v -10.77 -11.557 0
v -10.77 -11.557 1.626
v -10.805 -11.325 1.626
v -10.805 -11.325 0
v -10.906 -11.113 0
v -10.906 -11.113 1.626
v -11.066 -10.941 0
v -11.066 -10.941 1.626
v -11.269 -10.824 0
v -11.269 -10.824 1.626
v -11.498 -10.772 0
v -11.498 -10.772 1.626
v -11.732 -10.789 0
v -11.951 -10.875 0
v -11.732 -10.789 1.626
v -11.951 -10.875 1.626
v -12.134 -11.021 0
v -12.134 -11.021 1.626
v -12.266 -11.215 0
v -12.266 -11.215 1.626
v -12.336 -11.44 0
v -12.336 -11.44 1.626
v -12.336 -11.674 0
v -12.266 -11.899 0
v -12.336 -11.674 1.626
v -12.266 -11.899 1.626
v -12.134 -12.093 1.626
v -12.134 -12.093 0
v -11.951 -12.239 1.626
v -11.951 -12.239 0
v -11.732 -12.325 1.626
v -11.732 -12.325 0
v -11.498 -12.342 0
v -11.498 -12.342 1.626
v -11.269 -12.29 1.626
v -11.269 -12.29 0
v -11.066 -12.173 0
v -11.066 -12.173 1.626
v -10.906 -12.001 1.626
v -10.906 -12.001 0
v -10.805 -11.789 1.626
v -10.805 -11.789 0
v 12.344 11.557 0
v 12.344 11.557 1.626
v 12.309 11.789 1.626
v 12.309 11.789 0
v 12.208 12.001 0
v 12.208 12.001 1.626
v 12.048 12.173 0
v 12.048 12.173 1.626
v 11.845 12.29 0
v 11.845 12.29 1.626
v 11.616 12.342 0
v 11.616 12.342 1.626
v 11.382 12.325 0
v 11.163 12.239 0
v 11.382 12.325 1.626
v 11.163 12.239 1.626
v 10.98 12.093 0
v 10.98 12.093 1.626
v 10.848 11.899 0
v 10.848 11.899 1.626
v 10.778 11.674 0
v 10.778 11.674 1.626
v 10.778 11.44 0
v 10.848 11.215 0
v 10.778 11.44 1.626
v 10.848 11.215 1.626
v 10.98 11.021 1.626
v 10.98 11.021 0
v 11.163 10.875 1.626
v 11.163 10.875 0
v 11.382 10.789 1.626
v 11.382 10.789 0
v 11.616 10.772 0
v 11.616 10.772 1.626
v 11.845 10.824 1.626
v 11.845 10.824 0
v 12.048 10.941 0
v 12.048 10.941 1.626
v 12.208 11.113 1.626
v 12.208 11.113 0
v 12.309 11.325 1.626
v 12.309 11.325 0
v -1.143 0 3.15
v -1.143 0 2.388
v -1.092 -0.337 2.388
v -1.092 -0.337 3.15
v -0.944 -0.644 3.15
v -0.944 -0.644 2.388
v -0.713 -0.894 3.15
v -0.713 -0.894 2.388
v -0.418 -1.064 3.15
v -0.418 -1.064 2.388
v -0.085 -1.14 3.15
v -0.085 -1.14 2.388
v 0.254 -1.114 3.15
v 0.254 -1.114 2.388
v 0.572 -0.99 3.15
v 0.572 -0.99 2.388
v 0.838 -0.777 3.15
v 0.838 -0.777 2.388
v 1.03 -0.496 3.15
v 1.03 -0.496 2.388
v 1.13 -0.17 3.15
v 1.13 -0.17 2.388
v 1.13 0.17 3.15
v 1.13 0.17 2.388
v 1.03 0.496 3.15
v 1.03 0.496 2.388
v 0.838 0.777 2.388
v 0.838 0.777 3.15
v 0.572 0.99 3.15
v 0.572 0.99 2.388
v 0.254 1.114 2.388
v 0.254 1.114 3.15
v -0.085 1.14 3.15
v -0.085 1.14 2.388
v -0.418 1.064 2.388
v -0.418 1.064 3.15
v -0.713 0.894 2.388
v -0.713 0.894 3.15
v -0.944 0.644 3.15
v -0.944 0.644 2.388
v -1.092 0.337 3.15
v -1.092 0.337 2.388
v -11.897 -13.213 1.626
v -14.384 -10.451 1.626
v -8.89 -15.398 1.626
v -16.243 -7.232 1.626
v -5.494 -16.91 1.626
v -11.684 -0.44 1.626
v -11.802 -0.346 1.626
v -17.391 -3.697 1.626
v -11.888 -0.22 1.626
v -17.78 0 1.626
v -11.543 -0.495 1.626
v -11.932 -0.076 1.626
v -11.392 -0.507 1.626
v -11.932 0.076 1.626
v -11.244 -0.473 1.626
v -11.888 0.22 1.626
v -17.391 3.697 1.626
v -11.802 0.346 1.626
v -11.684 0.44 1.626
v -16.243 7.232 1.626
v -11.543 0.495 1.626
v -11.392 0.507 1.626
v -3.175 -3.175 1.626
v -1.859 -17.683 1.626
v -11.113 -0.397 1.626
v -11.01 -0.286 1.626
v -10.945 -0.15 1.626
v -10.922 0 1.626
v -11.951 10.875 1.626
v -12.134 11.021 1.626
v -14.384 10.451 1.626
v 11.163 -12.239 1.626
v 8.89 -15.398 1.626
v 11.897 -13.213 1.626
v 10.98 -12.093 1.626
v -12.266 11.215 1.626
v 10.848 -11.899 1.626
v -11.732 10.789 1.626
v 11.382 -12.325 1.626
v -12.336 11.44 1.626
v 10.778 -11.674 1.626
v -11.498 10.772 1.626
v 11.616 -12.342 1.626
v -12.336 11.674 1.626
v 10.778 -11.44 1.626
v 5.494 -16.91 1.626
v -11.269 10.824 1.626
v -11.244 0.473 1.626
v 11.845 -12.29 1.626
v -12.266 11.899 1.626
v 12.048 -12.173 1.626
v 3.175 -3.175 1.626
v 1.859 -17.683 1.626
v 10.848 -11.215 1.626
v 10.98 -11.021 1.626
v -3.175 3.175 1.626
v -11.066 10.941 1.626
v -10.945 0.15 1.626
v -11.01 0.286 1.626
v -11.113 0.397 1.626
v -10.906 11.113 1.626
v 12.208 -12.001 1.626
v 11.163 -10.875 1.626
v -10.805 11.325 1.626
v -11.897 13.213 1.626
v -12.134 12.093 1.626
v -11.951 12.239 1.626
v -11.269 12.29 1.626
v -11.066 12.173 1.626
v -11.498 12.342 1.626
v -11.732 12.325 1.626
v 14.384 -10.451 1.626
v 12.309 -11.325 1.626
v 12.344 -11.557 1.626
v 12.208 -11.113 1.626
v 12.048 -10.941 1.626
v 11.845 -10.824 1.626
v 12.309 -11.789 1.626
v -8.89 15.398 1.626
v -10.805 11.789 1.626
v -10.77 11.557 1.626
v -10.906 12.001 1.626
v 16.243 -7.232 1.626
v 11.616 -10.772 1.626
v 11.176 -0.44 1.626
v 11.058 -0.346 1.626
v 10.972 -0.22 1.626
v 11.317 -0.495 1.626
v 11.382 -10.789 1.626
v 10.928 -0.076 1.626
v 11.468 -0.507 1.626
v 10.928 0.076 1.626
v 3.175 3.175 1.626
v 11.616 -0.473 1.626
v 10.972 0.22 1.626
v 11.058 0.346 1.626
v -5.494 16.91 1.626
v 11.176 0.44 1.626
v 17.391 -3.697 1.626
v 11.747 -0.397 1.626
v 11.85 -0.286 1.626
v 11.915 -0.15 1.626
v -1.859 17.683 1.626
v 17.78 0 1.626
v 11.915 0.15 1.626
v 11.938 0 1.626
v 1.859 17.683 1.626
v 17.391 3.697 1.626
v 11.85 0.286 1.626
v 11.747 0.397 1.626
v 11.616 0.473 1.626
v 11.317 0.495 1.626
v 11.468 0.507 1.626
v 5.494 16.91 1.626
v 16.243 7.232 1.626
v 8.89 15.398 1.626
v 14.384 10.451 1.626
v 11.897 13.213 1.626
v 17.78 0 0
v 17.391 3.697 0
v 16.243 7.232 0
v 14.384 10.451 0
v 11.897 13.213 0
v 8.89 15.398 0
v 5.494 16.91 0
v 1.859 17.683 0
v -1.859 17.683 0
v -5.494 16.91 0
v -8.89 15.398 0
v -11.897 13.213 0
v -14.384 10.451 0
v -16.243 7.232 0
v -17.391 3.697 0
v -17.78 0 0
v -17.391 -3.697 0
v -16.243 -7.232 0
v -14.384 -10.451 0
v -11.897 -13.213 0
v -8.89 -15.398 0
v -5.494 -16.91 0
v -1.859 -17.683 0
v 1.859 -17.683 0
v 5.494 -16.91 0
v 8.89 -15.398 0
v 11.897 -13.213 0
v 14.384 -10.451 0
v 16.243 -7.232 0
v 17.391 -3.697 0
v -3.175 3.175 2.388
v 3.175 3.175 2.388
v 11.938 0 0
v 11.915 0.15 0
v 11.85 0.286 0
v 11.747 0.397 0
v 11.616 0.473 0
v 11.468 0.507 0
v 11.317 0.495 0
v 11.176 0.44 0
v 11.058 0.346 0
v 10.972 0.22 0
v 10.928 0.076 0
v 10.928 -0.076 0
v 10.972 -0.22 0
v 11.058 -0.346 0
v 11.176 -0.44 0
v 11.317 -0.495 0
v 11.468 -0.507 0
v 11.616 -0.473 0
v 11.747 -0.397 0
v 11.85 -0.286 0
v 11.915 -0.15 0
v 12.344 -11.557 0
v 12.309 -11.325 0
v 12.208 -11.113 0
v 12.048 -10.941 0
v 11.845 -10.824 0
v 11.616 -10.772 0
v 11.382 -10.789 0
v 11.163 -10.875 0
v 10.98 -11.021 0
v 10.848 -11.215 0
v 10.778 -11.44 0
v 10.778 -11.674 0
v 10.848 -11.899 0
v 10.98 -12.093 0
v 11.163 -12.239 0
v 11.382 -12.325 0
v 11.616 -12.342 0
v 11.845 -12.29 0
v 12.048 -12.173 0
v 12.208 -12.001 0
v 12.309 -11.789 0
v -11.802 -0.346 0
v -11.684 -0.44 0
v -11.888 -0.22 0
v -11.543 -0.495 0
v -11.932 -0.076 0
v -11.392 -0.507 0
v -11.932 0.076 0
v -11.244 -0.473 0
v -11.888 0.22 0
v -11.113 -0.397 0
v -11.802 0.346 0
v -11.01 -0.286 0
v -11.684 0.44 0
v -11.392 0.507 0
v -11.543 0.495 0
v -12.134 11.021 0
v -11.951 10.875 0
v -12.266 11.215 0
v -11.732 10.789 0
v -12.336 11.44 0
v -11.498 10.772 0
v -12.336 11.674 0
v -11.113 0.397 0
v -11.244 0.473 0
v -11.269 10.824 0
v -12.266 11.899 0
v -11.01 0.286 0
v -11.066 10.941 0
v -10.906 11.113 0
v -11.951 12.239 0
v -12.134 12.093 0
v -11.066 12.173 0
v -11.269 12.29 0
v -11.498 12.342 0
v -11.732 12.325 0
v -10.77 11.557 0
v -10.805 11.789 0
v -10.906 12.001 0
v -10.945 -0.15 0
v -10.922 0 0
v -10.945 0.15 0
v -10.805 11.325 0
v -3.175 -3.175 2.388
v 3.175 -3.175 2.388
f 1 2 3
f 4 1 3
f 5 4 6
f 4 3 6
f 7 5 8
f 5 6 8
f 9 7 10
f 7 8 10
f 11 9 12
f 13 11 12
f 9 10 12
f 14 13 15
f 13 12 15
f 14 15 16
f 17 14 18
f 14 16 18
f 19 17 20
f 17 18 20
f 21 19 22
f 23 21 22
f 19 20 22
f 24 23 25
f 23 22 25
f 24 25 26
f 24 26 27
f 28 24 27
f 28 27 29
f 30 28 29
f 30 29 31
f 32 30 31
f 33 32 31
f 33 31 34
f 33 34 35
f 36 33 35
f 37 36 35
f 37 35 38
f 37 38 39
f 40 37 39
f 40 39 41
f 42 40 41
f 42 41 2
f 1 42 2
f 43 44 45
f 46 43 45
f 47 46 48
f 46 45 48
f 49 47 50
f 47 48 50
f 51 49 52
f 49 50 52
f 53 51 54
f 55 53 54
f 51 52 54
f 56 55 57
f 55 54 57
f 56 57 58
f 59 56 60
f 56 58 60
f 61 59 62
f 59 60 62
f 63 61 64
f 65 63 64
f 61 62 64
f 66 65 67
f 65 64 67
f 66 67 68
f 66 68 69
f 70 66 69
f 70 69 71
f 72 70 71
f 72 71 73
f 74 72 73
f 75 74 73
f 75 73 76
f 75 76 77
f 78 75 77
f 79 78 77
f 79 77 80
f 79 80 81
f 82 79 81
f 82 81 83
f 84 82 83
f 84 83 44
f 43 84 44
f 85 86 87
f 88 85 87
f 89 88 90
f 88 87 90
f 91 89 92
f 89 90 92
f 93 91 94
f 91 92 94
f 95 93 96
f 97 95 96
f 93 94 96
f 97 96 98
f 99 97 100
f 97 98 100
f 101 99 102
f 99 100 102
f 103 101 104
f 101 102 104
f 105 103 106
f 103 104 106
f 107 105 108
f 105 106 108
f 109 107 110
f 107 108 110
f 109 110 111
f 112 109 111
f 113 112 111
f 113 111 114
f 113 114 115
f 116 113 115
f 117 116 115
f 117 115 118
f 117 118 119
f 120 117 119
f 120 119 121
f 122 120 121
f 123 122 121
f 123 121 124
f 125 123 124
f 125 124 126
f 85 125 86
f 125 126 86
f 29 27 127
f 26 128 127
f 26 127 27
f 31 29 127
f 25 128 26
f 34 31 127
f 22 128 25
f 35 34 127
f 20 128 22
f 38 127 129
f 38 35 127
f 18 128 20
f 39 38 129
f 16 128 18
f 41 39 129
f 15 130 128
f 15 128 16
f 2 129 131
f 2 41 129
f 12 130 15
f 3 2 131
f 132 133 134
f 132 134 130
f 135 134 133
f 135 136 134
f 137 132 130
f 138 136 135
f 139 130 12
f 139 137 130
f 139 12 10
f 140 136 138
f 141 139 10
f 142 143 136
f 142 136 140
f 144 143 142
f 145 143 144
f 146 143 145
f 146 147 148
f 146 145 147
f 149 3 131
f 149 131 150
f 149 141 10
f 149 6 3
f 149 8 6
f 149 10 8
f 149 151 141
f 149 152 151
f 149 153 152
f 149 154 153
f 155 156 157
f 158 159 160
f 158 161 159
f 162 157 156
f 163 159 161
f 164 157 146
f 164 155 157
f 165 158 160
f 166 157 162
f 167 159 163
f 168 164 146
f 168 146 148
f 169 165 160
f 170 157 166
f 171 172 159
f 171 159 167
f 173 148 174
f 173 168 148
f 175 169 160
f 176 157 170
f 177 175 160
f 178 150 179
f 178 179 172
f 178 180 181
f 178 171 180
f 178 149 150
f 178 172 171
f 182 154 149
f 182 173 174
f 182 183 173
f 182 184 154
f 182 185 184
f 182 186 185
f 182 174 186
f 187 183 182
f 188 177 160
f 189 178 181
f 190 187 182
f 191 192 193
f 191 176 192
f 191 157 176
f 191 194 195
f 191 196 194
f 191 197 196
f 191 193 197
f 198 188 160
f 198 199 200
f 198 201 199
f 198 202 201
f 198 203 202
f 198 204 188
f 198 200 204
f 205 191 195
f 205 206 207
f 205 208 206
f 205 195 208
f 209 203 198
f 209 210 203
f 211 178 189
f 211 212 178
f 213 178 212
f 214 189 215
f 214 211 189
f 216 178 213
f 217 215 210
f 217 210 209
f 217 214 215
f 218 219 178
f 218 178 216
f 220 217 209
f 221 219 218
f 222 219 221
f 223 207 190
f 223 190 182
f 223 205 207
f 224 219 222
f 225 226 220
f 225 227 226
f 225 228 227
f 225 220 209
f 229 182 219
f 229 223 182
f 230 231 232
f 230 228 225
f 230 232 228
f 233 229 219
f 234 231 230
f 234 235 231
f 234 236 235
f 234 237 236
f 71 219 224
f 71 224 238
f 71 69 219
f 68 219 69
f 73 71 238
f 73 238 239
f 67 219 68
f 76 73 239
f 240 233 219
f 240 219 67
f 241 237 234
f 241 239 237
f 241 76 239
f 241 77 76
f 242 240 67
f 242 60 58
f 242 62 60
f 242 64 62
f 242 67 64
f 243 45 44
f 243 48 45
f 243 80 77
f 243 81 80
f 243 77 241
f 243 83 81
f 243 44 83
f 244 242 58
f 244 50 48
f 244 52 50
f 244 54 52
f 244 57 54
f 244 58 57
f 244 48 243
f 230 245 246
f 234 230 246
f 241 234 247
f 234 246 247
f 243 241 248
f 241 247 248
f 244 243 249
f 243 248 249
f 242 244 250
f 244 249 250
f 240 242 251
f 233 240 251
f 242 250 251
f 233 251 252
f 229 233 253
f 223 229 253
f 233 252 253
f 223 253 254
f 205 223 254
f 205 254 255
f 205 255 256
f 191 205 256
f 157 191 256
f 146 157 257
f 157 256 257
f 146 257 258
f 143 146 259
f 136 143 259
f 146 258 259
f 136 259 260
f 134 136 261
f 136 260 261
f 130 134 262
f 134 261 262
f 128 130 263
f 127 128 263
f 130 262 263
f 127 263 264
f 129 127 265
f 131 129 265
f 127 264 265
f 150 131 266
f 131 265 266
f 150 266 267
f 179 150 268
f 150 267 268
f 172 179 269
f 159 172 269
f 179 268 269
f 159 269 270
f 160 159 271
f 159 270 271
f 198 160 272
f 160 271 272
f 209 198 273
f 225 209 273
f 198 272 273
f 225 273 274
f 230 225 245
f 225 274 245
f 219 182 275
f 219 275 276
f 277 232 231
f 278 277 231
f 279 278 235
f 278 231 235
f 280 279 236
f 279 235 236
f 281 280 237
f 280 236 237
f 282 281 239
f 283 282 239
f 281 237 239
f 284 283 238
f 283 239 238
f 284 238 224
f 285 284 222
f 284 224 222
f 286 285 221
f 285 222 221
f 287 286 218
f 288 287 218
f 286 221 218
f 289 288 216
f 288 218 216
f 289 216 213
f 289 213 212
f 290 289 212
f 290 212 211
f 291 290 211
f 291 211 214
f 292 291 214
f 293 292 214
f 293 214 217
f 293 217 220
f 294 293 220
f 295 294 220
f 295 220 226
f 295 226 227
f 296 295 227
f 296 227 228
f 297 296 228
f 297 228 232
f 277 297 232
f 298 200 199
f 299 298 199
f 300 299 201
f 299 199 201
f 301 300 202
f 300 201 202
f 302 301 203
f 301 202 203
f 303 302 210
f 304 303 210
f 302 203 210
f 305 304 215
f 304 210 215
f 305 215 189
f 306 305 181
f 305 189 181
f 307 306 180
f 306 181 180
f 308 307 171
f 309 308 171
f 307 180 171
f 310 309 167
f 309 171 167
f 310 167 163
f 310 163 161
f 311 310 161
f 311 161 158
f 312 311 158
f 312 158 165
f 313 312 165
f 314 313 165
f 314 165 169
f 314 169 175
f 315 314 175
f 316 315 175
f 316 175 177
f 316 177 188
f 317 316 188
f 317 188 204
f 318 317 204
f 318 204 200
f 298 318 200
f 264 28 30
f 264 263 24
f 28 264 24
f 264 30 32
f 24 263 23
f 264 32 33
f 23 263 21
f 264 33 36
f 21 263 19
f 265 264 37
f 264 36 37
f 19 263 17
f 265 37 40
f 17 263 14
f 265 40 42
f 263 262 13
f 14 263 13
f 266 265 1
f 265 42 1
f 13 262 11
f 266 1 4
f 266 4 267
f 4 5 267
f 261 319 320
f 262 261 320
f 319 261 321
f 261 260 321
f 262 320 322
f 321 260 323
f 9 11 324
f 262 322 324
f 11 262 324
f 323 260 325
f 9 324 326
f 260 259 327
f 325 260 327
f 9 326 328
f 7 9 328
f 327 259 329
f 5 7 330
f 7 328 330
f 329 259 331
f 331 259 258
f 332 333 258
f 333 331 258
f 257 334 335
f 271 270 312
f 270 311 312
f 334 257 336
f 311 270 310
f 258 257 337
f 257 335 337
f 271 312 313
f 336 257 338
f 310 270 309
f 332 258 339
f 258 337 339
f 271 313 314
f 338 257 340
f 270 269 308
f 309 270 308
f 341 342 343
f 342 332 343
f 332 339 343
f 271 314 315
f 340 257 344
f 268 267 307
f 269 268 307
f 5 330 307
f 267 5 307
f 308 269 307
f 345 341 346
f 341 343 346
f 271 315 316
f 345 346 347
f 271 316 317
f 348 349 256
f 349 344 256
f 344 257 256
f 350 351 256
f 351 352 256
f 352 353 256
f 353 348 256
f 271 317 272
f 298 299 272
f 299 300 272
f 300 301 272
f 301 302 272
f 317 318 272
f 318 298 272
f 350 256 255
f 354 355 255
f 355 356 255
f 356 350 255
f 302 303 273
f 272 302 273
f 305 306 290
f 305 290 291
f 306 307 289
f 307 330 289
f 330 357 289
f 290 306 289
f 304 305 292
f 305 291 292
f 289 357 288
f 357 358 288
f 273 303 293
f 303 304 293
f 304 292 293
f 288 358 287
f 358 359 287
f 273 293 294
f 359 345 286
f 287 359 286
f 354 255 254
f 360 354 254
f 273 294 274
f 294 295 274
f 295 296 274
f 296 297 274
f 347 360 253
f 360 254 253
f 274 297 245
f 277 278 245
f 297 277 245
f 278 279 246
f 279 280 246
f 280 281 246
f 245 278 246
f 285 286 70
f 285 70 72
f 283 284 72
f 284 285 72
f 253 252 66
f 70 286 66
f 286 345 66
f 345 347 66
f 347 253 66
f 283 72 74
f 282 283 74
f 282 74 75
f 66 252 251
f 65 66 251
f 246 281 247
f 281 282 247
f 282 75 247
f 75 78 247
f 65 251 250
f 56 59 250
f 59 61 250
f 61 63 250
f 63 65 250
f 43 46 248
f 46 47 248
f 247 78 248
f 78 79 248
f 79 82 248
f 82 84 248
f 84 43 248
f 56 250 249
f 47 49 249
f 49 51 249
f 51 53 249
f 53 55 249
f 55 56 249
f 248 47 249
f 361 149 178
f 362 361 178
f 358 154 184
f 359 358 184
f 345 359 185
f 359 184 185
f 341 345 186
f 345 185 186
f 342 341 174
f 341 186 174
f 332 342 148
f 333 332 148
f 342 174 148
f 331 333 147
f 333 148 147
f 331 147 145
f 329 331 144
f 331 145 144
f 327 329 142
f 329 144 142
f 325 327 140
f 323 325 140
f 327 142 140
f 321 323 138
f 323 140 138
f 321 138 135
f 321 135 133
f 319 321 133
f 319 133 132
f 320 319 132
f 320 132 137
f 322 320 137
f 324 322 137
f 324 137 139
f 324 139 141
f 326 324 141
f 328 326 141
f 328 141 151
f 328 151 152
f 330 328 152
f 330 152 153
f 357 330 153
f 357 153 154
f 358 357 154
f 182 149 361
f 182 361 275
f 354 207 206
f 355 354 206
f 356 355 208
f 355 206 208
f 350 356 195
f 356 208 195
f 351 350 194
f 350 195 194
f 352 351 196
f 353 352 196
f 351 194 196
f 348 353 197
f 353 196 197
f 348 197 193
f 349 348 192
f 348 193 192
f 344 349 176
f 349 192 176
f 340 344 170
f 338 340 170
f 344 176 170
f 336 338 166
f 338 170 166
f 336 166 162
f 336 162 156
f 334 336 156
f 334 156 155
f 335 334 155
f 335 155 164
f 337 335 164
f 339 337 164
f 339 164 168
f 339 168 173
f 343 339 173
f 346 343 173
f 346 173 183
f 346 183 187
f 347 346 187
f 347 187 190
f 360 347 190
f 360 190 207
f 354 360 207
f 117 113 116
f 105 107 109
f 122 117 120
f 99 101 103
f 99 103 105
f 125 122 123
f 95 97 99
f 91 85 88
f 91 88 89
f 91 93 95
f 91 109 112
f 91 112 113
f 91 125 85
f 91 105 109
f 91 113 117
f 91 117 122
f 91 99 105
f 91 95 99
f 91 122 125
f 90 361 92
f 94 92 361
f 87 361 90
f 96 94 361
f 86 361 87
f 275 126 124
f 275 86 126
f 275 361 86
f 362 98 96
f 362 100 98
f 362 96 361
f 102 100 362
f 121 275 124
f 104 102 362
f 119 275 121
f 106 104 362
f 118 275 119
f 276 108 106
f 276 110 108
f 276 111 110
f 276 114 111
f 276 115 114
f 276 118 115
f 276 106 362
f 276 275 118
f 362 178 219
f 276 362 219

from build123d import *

# Parameters (mm, degrees)
SKETCH1_R           = 17.78
BOSS_EXTRUDE1_DEPTH = 1.6256
SKETCH2_R           = 0.508
CUT_EXTRUDE1_DEPTH  = 26.197209674
SKETCH3_W           = 6.35
SKETCH3_H           = 6.35
BOSS_EXTRUDE2_DEPTH = 0.762
SKETCH4_R           = 1.143
BOSS_EXTRUDE3_DEPTH = 0.762
SKETCH5_R           = 0.7874
CUT_EXTRUDE2_DEPTH  = 26.197209674


with BuildPart() as part:
    # Sketch1 → Boss-Extrude1 (new body)
    with BuildSketch(Plane.XY):
        Circle(SKETCH1_R)
    extrude(amount=BOSS_EXTRUDE1_DEPTH)

    # Sketch2 → Cut-Extrude1 (cut, through all)
    with BuildSketch(Plane.XY.offset(1.6256)):
        with Locations((-11.43, 0)):
            Circle(SKETCH2_R)
        with Locations((11.43, 0)):
            Circle(SKETCH2_R)
    extrude(amount=-CUT_EXTRUDE1_DEPTH, mode=Mode.SUBTRACT)

    # Sketch3 → Boss-Extrude2 (add)
    with BuildSketch(Plane.XY.offset(1.6256)):
        Rectangle(SKETCH3_W, SKETCH3_H)
    extrude(amount=BOSS_EXTRUDE2_DEPTH)

    # Sketch4 → Boss-Extrude3 (add)
    with BuildSketch(Plane.XY.offset(2.3876)):
        with Locations(Location((0, 0, 0), (0, 0, 180))):
            Circle(SKETCH4_R)
    extrude(amount=BOSS_EXTRUDE3_DEPTH)

    # Sketch5 → Cut-Extrude2 (cut, through all)
    with BuildSketch(Plane.XY.offset(1.6256)):
        with Locations((-11.557, 11.557)):
            Circle(SKETCH5_R)
        with Locations((11.557, 11.557)):
            Circle(SKETCH5_R)
        with Locations((11.557, -11.557)):
            Circle(SKETCH5_R)
        with Locations((-11.557, -11.557)):
            Circle(SKETCH5_R)
    extrude(amount=-CUT_EXTRUDE2_DEPTH, mode=Mode.SUBTRACT)


solid = part.part
